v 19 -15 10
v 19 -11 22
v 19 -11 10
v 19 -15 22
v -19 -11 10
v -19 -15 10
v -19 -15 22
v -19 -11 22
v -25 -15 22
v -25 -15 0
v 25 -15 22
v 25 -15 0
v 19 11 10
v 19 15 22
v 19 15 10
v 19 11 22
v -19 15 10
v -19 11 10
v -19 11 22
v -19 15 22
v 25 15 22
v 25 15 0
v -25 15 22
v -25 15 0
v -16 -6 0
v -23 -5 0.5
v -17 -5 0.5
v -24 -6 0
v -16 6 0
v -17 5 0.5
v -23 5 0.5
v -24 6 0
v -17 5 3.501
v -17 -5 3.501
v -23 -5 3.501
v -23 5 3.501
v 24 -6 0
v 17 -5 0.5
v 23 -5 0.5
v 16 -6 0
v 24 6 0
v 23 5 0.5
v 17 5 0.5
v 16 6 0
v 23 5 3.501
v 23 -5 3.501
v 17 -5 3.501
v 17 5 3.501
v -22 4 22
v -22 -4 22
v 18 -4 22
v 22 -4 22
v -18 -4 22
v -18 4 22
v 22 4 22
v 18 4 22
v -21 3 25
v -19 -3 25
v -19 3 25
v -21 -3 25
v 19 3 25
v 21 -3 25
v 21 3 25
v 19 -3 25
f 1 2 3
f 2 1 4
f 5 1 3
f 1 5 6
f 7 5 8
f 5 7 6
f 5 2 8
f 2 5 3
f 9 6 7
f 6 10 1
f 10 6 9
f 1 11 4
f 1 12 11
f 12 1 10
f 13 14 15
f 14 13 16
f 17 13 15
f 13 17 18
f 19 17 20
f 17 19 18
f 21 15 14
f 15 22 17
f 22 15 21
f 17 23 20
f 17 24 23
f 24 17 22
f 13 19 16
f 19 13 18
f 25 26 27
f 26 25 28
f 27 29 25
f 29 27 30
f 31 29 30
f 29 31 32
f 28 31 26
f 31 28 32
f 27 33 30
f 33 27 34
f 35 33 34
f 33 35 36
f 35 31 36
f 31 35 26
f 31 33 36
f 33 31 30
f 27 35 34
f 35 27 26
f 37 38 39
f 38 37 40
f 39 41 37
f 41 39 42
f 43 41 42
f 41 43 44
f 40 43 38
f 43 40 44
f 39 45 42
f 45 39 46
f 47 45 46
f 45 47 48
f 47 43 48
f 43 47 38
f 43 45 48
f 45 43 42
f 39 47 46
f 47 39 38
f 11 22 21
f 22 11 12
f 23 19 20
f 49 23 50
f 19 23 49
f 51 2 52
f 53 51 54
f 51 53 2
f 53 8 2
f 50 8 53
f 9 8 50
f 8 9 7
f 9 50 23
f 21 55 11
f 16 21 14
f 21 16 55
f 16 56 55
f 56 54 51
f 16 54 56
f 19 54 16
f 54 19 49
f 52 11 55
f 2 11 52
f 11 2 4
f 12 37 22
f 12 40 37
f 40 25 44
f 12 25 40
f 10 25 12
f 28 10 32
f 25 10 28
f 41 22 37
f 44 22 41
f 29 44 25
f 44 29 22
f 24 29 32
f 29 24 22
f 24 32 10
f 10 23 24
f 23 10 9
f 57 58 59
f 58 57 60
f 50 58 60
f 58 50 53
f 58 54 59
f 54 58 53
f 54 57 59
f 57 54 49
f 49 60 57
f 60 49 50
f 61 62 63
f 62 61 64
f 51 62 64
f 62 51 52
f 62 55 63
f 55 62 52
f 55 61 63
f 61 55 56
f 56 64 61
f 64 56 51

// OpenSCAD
// P3-GrooveKey-v2; mm; origin = bottom plane centre.
// Dimensional reference is parameters.json; total envelope 50 x 30 x 25.
module rect_loft(cx,z,h,bottom,top) {
  bx=bottom[0]/2; by=bottom[1]/2; tx=top[0]/2; ty=top[1]/2;
  polyhedron(points=[[cx-bx,-by,z],[cx+bx,-by,z],[cx+bx,by,z],[cx-bx,by,z],
                     [cx-tx,-ty,z+h],[cx+tx,-ty,z+h],[cx+tx,ty,z+h],[cx-tx,ty,z+h]],
             faces=[[3,2,1,0],[4,5,6,7],[0,1,5,4],[1,2,6,5],[2,3,7,6],[3,0,4,7]]);
}
union() {
  difference() {
    translate([-25,-15,0]) cube([50,30,22]);
    for (y=[-15,11]) translate([-19,y,10]) cube([38,4,12.01]);
    for (x=[-20,20]) {
      rect_loft(x,-0.001,0.501,[8.004,12.004],[6,10]);
      translate([x-3,-5,0.499]) cube([6,10,3.002]);
    }
  }
  for (x=[-20,20]) rect_loft(x,22,3,[4,8],[2,6]);
}
